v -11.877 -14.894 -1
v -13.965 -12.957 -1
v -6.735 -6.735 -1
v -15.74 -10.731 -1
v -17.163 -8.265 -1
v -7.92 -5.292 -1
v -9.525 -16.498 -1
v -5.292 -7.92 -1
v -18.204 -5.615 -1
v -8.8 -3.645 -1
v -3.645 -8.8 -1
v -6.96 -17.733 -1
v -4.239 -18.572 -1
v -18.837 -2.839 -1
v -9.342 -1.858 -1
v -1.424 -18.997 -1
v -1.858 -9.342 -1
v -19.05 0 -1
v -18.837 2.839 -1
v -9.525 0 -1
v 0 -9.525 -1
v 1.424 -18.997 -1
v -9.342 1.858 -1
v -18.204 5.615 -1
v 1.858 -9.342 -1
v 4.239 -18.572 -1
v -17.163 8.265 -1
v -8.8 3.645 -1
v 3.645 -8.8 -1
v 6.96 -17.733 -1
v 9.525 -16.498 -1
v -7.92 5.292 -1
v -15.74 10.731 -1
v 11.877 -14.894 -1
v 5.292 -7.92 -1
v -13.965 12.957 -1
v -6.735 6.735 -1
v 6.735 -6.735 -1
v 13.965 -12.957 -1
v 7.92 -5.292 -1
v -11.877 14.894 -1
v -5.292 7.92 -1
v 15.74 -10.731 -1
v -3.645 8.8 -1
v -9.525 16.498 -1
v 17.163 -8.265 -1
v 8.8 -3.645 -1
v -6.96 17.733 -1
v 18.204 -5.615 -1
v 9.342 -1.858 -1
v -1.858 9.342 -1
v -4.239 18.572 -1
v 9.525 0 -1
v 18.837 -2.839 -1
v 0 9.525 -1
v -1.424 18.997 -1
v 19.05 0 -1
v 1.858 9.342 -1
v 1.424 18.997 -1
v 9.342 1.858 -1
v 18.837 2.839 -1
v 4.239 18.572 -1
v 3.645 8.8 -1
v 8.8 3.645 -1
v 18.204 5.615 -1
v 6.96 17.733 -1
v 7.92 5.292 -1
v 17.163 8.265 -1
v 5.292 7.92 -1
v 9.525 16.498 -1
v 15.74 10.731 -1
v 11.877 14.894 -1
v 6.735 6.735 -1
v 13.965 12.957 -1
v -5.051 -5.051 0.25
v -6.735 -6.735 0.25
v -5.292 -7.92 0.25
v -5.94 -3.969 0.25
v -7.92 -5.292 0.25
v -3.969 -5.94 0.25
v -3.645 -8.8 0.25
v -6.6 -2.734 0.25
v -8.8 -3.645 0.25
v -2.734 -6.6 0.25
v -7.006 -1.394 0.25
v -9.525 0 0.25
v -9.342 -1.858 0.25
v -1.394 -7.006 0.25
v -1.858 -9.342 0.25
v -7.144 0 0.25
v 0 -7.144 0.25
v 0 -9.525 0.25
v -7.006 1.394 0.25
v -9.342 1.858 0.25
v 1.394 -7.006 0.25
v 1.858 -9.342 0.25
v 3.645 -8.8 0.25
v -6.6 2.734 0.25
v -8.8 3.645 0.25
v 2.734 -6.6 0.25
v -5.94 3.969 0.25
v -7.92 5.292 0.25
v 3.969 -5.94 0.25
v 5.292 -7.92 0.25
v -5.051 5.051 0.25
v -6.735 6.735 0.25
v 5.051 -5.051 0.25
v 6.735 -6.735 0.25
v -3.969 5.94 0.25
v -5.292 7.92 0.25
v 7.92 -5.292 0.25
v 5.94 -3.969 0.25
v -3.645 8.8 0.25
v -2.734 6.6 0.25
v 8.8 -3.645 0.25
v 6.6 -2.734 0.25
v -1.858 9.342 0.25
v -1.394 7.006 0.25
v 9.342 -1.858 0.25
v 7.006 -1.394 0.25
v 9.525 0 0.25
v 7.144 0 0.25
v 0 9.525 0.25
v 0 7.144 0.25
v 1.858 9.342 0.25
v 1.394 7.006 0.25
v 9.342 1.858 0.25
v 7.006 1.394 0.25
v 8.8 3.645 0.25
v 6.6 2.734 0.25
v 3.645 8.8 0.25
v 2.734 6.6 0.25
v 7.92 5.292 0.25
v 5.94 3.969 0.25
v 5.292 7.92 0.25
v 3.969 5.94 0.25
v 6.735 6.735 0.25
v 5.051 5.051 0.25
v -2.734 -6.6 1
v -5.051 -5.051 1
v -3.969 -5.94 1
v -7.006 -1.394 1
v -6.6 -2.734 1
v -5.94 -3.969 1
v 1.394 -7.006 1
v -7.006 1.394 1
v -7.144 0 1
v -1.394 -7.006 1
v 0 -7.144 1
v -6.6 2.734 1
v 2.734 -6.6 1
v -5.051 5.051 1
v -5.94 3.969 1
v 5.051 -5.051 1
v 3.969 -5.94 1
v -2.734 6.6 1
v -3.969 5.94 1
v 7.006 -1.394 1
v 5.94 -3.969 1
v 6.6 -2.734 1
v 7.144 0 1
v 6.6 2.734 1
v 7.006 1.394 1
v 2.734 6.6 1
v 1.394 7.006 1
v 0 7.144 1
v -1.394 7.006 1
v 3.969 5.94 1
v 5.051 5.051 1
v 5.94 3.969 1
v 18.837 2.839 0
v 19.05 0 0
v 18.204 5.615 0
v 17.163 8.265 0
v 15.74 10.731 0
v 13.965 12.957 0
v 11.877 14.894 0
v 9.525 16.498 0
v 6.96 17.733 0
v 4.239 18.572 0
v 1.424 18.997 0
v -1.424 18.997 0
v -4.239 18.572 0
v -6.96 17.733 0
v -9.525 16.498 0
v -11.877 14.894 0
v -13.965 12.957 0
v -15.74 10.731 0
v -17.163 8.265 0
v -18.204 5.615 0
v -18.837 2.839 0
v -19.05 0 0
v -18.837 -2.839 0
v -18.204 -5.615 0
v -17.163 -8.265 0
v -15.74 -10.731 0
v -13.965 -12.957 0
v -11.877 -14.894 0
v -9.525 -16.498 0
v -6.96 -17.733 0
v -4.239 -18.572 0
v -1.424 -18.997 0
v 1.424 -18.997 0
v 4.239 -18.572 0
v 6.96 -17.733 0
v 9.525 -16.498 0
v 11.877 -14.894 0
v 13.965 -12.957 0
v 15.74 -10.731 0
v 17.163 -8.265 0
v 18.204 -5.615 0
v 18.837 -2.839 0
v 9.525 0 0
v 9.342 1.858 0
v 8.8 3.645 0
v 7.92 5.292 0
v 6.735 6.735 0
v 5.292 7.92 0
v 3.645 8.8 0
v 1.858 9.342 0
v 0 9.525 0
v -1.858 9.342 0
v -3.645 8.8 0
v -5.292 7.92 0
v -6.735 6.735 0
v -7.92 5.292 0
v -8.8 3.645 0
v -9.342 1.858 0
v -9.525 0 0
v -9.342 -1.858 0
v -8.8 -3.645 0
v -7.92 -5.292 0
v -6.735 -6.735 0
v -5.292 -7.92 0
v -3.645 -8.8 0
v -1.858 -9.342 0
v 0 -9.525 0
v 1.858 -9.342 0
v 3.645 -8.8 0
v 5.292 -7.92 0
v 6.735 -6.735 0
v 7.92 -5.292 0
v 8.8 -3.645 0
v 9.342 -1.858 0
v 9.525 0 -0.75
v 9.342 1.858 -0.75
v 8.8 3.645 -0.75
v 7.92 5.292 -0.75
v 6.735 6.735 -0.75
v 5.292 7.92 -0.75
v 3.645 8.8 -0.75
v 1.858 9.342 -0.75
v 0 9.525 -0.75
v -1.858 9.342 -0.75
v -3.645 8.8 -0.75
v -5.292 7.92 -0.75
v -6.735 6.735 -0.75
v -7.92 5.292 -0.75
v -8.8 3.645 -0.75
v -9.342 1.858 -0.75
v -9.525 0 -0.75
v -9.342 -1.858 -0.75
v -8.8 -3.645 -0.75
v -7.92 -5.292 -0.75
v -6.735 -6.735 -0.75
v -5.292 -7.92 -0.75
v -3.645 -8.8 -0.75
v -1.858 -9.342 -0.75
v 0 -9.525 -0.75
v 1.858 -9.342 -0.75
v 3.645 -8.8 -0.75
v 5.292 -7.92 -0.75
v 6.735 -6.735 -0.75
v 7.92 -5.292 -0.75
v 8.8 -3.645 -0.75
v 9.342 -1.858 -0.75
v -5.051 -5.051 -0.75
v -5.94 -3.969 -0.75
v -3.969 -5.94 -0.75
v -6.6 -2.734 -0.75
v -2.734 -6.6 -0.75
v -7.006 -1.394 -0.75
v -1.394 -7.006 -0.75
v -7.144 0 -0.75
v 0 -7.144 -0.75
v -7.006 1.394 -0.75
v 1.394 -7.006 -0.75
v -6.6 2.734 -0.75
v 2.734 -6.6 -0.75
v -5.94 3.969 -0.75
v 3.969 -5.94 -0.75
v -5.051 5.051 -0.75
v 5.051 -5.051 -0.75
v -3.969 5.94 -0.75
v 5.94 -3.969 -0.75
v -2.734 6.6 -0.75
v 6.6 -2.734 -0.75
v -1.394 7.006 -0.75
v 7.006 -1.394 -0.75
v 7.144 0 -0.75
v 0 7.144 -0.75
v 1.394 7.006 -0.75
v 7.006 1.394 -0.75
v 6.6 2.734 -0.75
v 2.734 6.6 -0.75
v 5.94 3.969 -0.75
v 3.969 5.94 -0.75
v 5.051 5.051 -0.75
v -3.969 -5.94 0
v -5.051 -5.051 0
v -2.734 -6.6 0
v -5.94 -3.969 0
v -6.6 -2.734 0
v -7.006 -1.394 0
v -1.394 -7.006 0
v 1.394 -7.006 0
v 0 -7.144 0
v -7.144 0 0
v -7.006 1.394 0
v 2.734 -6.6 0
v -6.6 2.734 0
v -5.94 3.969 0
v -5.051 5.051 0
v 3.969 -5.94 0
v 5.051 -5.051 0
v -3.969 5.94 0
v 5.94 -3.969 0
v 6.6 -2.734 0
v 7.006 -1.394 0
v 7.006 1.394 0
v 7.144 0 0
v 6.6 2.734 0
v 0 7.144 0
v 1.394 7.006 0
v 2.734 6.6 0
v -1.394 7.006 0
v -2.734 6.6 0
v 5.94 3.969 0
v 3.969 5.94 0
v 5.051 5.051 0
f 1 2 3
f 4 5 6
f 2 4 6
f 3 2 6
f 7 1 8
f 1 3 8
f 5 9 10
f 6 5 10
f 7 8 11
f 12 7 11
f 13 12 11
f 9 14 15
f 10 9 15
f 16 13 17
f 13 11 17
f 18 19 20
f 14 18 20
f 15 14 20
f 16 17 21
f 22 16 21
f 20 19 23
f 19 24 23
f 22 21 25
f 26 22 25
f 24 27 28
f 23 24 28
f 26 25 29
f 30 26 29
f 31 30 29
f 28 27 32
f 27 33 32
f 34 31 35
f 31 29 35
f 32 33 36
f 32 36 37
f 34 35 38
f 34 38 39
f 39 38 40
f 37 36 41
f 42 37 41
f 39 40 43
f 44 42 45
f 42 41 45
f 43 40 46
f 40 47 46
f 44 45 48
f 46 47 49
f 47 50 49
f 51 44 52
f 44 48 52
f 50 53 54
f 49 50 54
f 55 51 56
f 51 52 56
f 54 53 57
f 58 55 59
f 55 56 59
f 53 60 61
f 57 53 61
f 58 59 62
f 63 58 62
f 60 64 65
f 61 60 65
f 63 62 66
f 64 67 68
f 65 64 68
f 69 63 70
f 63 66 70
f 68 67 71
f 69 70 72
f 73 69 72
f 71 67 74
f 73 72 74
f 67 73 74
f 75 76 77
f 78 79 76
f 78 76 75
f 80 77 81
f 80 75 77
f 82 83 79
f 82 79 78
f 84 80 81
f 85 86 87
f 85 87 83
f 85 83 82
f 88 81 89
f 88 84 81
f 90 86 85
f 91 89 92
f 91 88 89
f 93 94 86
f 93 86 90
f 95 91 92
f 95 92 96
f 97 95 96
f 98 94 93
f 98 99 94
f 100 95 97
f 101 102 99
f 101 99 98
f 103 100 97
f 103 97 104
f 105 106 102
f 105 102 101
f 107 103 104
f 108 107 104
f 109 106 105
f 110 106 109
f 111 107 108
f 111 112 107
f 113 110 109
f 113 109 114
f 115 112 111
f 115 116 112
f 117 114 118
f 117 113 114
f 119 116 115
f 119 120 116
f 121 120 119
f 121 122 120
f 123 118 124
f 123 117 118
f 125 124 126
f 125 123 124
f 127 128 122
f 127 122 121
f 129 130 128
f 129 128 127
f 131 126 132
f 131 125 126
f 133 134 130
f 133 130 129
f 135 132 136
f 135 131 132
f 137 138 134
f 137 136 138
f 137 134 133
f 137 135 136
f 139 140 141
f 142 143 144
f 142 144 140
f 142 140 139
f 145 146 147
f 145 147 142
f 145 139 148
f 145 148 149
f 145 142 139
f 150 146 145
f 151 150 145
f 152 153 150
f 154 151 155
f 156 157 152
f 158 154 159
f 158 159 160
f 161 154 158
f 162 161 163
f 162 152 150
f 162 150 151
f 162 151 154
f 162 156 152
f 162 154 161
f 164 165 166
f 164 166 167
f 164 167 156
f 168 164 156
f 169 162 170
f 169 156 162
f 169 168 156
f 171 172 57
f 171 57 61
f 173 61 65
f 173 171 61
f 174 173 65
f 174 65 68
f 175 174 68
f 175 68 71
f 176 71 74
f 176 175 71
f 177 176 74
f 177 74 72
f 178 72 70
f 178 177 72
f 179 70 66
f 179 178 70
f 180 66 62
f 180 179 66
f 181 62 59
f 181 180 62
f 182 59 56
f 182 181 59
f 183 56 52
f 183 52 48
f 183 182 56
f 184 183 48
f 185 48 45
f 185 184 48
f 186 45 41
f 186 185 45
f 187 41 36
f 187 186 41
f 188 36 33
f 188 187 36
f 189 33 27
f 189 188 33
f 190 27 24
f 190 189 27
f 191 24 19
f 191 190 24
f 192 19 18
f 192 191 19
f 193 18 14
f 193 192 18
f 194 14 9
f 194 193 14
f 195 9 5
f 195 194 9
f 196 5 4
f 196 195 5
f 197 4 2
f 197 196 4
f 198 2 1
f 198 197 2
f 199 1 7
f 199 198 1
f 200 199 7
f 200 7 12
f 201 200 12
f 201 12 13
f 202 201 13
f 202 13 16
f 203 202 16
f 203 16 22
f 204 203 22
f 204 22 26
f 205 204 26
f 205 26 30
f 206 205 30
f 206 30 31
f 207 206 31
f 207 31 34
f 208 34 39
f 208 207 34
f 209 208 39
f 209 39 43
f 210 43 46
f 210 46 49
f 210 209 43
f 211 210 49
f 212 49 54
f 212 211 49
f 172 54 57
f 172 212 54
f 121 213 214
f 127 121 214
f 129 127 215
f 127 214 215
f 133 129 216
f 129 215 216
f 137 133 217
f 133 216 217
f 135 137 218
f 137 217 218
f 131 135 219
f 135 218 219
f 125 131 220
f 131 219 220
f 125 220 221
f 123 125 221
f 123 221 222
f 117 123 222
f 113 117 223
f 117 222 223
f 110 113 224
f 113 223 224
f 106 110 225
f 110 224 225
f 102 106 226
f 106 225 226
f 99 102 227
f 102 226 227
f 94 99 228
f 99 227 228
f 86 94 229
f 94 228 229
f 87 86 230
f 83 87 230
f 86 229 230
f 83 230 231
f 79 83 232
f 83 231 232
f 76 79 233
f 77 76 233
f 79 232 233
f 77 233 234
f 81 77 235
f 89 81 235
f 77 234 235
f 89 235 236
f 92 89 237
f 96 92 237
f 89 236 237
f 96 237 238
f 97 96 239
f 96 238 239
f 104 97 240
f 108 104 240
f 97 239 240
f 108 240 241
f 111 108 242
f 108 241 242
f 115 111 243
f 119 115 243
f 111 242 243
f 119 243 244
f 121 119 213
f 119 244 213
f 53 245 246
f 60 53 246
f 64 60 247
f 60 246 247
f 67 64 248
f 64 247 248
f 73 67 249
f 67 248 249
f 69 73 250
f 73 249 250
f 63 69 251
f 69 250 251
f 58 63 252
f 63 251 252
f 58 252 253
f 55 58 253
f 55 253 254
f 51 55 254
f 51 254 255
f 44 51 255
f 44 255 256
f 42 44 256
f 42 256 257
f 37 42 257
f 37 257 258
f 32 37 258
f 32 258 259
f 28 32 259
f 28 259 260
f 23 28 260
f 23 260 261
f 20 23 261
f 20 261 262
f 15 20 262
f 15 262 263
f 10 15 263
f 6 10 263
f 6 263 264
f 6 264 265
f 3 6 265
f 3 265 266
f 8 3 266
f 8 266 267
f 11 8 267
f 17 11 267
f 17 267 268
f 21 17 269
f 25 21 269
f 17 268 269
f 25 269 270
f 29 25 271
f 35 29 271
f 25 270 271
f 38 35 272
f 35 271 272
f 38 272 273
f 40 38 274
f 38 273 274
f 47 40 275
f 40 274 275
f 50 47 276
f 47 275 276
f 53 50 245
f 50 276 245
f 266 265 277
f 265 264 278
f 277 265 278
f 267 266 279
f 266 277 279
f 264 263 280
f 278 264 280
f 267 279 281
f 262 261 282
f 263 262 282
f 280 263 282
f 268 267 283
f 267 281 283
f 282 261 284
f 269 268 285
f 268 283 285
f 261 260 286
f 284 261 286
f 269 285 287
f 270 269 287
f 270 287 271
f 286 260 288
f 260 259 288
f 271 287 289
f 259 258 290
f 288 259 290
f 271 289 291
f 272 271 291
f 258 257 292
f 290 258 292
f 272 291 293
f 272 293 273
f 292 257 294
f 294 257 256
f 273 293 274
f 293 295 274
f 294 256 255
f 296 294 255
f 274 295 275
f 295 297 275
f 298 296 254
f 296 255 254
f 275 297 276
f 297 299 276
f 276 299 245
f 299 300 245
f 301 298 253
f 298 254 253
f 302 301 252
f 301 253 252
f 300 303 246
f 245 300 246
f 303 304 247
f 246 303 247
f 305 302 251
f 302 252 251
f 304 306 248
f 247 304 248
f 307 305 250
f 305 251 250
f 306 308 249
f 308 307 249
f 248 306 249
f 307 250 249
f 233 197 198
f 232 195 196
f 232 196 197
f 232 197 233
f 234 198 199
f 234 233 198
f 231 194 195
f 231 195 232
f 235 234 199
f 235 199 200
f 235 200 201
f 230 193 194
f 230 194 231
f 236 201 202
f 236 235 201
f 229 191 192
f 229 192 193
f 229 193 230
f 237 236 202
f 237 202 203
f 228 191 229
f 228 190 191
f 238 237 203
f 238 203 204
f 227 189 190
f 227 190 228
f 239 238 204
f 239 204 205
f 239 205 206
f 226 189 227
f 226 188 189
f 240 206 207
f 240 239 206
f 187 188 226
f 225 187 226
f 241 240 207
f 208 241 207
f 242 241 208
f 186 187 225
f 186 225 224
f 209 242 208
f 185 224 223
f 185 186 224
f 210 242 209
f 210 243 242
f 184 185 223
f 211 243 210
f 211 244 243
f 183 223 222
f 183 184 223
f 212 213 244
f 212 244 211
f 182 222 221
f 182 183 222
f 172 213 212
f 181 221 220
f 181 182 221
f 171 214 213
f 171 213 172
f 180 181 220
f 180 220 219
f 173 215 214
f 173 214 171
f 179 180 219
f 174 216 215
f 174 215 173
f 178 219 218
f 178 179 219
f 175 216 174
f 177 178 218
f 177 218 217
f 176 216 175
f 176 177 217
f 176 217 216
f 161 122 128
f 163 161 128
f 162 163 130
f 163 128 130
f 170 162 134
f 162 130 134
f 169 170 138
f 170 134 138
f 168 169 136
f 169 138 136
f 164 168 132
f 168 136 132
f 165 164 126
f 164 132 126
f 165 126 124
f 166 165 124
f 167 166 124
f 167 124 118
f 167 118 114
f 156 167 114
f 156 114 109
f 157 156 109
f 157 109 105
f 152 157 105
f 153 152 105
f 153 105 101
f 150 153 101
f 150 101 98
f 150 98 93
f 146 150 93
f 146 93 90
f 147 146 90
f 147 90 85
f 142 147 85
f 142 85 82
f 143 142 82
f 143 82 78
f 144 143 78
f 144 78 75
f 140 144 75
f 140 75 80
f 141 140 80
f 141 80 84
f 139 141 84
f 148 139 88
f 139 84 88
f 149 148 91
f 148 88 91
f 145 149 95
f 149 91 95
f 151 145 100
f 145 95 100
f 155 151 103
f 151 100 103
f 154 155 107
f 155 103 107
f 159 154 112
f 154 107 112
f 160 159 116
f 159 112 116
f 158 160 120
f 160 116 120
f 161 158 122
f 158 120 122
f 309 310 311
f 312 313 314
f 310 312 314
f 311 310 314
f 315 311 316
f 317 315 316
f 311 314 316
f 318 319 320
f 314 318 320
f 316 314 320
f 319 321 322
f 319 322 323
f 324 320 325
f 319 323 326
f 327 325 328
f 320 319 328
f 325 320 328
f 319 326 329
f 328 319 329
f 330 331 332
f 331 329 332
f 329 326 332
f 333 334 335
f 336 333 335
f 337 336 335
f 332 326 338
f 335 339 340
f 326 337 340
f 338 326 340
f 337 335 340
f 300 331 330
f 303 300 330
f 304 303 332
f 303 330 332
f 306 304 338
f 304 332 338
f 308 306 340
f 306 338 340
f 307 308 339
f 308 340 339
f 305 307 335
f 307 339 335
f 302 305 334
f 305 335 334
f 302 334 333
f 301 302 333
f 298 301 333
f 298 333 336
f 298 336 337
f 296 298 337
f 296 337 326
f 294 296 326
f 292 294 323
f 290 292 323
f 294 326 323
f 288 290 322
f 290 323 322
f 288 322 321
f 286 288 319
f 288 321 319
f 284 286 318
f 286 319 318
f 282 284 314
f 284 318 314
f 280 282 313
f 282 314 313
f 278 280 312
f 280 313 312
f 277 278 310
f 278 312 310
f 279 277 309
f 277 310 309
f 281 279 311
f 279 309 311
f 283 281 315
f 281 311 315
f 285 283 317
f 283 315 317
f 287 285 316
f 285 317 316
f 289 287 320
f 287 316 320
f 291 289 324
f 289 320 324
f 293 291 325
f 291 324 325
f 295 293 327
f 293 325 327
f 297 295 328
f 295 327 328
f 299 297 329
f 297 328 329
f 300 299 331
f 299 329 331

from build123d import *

# Parameters (mm, degrees)
F0_R     = 19.05
F0_R_2   = 9.525
F1_DEPTH = 1
F0_R_3   = 7.14375
F2_DEPTH = 0.25
F3_DEPTH = 1
F4_DEPTH = 0.75


with BuildPart() as f1:
    # F0 (on Top) → F1 (new body)
    with BuildSketch(Plane.XY):
        Circle(F0_R)
        Circle(F0_R_2, mode=Mode.SUBTRACT)
    extrude(amount=-F1_DEPTH)



with BuildPart() as f2:
    # F0 (on Top) → F2 (new body)
    with BuildSketch(Plane.XY):
        Circle(F0_R_2)
        Circle(F0_R_3, mode=Mode.SUBTRACT)
    extrude(amount=F2_DEPTH)

    # F0 (on Top) → F3 (join)
    with BuildSketch(Plane.XY):
        Circle(F0_R_3)
    extrude(amount=F3_DEPTH)


with BuildPart() as f1_1:
    add(f1.part)

    add(f2.part)  # F4 merges F2
    # F0 (on Top) → F4 (join)
    with BuildSketch(Plane.XY):
        Circle(F0_R_2)
        Circle(F0_R_3, mode=Mode.SUBTRACT)
    extrude(amount=-F4_DEPTH)


with BuildPart() as f5_1:
    # F5: copy of F1
    add(f1_1.part.moved(Location((0, 0, -6.35))))


solid = f1_1.part
